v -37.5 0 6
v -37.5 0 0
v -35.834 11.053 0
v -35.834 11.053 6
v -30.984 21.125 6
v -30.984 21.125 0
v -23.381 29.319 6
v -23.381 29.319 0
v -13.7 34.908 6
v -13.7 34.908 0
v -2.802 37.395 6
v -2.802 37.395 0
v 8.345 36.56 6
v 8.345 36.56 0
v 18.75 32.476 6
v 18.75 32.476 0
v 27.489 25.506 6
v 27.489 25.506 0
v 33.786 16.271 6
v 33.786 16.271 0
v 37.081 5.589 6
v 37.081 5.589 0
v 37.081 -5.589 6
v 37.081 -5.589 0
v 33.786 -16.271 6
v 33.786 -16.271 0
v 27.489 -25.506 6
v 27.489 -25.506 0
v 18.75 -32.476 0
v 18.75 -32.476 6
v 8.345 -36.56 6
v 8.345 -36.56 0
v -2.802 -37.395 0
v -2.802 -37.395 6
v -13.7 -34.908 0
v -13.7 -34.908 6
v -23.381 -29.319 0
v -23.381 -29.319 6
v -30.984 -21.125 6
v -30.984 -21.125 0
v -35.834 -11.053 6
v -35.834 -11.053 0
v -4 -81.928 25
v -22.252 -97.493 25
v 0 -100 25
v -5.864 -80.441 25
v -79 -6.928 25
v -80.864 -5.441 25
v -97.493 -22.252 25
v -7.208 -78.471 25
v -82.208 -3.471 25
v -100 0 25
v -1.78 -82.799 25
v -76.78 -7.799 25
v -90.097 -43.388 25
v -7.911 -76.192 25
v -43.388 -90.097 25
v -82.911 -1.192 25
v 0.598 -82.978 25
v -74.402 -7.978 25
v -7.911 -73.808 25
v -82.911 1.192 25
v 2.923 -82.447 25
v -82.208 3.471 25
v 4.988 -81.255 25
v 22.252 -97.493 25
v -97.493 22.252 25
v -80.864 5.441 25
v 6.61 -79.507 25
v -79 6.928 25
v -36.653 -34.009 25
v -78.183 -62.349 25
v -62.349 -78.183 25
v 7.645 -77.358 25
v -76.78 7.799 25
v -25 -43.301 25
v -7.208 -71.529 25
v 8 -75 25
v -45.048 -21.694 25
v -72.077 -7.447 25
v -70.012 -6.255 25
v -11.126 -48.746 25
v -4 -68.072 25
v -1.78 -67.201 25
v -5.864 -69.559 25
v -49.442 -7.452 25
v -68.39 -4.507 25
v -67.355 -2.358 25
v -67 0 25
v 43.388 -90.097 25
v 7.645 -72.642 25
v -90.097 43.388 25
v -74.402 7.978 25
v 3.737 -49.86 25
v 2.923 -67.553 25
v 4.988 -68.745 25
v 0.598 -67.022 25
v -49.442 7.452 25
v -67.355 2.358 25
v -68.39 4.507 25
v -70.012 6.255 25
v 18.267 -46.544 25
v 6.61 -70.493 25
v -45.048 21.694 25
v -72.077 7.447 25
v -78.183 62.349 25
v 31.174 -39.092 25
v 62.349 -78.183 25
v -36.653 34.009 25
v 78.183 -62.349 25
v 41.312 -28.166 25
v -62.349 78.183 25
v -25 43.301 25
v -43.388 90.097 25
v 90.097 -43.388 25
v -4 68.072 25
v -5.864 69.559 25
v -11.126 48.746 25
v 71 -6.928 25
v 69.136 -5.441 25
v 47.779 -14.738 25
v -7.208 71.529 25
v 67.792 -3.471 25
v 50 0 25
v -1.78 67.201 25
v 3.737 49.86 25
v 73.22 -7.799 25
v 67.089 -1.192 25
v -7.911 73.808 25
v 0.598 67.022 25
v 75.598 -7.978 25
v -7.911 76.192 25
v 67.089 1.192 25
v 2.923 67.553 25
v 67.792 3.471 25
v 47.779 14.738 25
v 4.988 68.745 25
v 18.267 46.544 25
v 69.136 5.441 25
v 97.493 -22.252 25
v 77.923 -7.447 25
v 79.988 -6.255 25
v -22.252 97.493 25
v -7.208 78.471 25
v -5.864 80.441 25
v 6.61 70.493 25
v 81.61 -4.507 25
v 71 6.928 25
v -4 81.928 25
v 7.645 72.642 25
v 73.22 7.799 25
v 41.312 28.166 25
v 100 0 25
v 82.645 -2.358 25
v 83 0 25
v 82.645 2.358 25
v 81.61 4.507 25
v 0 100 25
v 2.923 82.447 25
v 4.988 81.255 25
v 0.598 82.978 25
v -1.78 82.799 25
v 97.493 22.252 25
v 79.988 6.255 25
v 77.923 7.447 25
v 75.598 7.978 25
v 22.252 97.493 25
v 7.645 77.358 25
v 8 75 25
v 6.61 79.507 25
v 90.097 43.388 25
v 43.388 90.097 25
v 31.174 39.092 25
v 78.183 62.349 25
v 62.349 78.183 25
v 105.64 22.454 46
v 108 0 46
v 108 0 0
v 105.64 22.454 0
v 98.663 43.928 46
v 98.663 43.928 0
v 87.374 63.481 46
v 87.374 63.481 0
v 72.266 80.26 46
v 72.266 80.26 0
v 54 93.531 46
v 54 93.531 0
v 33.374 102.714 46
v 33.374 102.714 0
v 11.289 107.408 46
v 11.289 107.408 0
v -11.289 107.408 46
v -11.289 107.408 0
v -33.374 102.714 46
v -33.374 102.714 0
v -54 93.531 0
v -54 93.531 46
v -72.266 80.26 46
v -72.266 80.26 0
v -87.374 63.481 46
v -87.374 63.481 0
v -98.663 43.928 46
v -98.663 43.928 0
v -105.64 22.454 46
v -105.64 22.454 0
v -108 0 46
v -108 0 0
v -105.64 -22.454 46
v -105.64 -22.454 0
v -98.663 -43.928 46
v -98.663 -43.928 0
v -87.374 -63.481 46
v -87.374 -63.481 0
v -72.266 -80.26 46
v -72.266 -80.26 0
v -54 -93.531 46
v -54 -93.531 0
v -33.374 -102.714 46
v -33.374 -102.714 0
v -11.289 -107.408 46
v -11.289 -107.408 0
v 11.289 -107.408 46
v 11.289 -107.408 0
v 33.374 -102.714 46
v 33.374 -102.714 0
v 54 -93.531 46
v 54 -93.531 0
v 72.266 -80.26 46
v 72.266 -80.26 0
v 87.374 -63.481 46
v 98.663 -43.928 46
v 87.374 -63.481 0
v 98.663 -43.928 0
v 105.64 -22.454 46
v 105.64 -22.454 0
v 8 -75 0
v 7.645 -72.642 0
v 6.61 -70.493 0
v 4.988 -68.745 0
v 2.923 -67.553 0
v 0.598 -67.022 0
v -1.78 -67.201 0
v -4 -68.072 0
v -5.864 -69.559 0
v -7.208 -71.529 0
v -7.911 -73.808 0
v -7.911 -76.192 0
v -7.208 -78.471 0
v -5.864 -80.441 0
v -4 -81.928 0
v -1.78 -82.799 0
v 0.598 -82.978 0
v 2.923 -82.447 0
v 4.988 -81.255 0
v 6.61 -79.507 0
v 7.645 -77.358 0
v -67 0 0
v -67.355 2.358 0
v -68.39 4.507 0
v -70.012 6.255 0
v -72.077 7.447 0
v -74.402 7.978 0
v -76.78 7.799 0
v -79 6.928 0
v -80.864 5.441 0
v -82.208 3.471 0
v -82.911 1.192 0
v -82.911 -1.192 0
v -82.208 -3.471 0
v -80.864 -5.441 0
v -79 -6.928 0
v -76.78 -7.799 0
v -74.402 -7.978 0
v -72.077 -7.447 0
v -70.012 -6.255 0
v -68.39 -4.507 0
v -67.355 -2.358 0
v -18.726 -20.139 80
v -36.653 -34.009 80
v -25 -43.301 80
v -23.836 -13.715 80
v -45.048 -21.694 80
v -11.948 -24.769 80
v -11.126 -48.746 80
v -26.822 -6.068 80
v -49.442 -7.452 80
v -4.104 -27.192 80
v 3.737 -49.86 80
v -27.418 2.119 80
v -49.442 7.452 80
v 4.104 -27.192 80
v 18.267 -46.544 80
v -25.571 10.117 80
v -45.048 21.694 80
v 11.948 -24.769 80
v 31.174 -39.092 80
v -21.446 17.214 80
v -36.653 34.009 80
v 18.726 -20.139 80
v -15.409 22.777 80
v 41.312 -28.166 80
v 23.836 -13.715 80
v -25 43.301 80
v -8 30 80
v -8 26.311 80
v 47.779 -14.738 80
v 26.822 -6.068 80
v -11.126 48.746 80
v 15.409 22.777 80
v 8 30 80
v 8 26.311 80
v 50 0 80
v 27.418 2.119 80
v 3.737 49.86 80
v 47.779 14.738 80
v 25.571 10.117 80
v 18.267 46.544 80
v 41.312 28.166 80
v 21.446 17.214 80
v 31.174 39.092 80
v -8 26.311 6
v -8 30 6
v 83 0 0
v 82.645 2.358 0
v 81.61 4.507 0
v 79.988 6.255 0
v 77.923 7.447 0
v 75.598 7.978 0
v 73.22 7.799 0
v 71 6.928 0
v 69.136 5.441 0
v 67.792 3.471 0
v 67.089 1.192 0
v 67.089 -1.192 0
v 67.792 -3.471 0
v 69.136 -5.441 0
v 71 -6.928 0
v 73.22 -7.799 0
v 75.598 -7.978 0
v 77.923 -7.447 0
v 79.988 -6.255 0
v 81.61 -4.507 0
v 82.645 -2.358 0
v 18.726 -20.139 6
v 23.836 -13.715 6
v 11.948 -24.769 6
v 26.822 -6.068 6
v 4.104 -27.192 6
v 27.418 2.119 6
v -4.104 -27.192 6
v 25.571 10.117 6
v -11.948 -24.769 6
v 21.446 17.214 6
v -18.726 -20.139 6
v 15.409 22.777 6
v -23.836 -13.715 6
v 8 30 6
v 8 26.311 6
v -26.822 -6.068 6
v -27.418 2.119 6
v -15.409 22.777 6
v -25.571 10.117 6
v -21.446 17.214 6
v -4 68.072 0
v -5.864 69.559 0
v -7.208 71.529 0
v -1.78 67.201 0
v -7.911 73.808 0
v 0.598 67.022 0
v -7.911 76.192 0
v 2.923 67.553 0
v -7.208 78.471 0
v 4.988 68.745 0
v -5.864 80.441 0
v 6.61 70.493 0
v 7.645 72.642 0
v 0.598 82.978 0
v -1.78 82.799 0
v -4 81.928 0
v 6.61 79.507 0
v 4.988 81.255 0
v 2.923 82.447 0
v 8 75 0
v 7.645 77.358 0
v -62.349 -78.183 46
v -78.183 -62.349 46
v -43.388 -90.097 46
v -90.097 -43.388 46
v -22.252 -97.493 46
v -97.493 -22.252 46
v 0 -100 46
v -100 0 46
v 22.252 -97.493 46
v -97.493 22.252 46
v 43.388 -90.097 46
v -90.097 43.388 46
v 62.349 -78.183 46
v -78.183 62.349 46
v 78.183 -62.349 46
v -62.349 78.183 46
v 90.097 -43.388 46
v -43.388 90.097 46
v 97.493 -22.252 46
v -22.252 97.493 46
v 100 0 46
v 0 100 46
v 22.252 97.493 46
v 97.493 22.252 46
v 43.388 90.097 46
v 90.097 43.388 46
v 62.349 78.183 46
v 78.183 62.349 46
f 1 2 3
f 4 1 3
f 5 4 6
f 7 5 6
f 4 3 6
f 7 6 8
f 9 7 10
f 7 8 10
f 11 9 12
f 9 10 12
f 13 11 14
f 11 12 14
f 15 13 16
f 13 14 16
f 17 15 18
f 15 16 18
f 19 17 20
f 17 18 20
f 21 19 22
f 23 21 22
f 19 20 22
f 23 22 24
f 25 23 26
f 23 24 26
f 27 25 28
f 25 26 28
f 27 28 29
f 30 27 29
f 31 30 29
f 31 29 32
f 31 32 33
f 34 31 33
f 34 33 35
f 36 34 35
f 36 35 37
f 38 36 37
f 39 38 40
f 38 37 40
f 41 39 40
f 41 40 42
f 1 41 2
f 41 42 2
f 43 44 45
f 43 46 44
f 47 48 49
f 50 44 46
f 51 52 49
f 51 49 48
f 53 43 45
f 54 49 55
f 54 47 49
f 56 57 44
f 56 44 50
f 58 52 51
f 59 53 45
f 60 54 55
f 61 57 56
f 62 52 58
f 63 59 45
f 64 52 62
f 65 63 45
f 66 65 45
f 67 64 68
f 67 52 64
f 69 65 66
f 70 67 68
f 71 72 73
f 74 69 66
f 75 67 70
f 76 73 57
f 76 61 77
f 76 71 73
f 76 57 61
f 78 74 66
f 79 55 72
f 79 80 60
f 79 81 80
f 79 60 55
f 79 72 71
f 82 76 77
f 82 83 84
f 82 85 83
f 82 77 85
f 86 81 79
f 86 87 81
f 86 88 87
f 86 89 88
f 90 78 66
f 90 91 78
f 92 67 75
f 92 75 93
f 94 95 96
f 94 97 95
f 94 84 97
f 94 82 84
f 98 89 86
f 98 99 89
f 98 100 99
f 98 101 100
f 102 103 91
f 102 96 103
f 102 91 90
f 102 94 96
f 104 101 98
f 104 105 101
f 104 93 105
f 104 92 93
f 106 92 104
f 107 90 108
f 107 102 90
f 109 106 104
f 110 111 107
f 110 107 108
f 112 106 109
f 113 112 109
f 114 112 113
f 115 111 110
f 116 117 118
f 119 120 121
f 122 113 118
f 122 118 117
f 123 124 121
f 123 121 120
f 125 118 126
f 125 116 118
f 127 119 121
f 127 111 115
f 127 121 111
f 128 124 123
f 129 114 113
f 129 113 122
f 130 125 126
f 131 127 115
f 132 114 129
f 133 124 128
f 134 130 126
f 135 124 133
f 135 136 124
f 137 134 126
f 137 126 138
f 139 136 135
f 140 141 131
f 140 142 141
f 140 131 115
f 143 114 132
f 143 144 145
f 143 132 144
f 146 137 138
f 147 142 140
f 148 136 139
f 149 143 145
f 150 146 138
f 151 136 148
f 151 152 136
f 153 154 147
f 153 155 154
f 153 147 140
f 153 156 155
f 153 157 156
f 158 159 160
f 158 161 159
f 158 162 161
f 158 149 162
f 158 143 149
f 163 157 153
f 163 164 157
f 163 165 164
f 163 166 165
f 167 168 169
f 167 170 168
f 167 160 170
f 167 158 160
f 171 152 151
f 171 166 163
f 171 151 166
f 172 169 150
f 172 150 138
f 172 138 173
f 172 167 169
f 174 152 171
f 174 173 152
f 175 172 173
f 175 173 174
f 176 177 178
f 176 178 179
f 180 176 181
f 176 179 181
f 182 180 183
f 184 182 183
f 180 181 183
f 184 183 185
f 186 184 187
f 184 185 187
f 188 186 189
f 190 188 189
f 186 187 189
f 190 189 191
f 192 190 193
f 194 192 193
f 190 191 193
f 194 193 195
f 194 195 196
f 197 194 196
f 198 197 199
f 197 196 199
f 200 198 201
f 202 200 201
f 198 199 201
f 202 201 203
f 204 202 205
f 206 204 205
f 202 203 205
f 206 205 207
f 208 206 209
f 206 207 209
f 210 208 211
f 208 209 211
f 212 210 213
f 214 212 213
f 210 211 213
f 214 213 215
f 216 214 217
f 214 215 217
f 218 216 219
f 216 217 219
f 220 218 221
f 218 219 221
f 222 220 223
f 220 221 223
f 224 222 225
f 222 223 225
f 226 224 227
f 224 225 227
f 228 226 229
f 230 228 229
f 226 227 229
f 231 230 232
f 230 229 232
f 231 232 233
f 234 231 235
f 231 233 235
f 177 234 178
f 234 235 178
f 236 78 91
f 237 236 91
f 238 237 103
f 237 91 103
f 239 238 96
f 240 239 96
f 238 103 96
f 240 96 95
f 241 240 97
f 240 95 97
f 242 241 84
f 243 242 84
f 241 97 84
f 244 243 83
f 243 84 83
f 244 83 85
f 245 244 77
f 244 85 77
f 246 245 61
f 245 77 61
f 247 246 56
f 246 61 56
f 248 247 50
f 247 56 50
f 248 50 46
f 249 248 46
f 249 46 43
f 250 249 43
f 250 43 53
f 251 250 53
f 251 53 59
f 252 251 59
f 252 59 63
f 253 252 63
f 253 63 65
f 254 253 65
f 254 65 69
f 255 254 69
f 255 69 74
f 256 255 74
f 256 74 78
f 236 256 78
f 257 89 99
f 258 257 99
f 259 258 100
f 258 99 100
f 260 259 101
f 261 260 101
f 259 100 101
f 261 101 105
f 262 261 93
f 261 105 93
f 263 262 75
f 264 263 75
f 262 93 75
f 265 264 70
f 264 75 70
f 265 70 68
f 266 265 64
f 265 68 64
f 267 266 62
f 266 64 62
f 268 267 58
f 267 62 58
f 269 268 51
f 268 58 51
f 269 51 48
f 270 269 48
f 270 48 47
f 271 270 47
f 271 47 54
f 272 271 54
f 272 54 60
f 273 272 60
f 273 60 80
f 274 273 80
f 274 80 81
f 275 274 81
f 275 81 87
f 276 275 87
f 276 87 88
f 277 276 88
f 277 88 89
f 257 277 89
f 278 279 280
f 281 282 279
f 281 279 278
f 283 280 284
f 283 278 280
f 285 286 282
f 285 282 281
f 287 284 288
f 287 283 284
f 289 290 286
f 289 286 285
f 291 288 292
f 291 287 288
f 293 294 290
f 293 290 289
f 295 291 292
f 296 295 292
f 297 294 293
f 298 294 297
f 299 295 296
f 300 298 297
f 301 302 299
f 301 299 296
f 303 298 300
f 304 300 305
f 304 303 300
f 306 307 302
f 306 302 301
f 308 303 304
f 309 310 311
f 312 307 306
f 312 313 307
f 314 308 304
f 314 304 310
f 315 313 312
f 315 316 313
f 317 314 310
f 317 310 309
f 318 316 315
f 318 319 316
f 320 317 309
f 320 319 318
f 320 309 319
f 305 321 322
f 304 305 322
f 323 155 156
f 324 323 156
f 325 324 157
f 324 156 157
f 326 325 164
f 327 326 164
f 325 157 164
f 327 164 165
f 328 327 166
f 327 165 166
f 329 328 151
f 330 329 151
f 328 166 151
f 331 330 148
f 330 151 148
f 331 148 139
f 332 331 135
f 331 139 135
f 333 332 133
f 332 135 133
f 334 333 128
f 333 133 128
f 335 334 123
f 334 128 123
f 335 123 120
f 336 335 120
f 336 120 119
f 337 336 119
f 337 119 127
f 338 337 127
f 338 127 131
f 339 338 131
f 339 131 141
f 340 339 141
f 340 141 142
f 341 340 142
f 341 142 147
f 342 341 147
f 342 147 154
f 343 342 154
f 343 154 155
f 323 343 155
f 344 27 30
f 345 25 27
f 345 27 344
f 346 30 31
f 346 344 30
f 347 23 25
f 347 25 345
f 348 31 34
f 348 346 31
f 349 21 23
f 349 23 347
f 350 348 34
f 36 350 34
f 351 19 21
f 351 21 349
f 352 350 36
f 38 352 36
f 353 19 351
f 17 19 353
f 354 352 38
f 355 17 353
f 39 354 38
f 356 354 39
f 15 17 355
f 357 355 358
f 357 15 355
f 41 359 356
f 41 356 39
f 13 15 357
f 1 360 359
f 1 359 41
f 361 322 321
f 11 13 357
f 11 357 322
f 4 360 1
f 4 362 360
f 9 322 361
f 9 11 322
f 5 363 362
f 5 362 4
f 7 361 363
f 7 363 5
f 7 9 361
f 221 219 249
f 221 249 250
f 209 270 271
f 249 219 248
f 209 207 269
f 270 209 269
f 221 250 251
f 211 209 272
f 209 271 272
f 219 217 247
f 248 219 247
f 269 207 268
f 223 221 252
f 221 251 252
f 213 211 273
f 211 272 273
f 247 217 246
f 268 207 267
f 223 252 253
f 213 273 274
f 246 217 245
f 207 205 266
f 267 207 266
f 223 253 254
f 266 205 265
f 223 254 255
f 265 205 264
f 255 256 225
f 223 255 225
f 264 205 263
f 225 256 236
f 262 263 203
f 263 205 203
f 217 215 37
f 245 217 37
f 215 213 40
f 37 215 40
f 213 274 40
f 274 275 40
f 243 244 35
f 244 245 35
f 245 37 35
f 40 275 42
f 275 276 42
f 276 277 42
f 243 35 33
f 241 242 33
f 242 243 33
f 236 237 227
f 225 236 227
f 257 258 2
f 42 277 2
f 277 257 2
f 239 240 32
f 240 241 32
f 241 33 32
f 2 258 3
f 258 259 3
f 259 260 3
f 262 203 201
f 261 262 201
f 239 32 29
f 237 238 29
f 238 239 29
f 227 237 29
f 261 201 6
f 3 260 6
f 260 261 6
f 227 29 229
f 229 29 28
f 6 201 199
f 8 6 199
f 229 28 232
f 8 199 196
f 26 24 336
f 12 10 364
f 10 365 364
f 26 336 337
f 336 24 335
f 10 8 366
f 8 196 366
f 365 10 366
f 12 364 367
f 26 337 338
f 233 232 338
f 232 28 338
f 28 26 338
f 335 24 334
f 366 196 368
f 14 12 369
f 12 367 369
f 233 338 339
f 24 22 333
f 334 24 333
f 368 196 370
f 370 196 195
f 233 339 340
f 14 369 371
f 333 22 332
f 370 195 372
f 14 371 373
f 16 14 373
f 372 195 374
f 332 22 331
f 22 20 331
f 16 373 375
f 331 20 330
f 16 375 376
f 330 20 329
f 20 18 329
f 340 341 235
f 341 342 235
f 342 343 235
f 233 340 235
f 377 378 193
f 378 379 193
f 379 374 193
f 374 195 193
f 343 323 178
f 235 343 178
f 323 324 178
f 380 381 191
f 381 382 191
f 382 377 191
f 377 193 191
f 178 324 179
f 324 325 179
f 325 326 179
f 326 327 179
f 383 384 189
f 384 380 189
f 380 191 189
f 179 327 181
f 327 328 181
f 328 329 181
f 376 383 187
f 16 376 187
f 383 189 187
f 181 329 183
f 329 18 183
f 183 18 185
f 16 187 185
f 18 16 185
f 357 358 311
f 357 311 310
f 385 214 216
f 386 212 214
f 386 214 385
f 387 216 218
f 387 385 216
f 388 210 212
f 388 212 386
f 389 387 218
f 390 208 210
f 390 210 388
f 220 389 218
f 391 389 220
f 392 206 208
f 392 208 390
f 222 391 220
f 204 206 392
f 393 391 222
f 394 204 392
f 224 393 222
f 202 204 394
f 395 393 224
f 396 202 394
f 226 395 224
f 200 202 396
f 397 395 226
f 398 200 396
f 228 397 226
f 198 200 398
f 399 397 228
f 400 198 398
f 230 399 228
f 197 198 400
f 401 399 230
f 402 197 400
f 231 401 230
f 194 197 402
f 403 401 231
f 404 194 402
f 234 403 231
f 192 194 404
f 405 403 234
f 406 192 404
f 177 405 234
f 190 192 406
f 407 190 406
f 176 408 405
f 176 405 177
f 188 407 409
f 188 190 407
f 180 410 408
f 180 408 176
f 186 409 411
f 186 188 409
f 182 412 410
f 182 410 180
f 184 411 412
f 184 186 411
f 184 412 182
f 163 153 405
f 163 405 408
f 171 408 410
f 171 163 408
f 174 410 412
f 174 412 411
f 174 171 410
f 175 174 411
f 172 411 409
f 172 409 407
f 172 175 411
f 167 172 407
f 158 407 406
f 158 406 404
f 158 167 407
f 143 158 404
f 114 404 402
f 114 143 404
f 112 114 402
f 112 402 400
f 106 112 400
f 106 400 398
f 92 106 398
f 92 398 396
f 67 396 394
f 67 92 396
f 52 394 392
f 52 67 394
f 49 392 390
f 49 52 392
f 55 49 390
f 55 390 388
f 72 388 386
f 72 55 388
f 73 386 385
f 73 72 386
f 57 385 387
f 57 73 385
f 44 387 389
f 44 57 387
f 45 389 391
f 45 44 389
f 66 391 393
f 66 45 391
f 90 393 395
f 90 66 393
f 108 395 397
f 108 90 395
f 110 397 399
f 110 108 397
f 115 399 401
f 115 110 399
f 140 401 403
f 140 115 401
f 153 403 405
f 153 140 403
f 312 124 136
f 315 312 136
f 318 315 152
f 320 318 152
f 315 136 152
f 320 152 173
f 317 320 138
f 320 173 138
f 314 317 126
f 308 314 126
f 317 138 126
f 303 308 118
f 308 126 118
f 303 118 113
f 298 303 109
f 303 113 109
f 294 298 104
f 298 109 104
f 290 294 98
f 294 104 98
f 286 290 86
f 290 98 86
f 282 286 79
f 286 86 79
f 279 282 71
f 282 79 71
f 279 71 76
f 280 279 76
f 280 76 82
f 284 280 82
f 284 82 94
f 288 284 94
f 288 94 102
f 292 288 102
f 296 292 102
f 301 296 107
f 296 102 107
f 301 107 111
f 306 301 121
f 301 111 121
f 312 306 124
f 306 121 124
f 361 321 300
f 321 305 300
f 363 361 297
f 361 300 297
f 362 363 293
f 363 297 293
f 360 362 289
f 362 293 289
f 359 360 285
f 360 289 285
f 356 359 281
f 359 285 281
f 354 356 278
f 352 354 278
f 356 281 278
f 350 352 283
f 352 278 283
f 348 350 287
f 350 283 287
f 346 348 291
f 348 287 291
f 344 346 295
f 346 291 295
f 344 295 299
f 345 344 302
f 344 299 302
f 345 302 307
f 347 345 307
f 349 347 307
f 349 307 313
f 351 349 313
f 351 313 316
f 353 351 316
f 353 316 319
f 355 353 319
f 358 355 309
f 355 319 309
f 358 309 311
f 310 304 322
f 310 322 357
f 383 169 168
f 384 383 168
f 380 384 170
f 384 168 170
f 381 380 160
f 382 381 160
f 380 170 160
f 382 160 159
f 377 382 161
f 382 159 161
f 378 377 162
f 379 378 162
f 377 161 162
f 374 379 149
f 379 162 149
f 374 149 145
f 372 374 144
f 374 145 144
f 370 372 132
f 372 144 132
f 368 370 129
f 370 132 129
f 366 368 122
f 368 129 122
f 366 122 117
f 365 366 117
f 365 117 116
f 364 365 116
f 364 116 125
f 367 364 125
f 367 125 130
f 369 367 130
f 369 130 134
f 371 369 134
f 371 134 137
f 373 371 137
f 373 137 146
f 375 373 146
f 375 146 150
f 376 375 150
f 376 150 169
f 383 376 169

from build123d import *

# Parameters (mm, degrees)
SKETCH1_R           = 108
BOSS_EXTRUDE1_DEPTH = 25
SKETCH2_R           = 108
SKETCH2_R_2         = 100
BOSS_EXTRUDE2_DEPTH = 21
SKETCH3_R           = 50
SKETCH3_R_2         = 27.5
BOSS_EXTRUDE3_DEPTH = 55
SKETCH4_R           = 8
CUT_EXTRUDE1_DEPTH  = 26
SKETCH5_R           = 37.5
CUT_EXTRUDE2_DEPTH  = 6
SKETCH6_R           = 27.5
CUT_EXTRUDE4_DEPTH  = 26
SKETCH7_W           = 16
SKETCH7_H           = 30
CUT_EXTRUDE5_DEPTH  = 81


with BuildPart() as part:
    # Sketch1 → Boss-Extrude1 (new body)
    with BuildSketch(Plane.XY):
        Circle(SKETCH1_R)
    extrude(amount=BOSS_EXTRUDE1_DEPTH)

    # Sketch2 → Boss-Extrude2 (add)
    with BuildSketch(Plane.XY.offset(25)):
        Circle(SKETCH2_R)
        Circle(SKETCH2_R_2, mode=Mode.SUBTRACT)
    extrude(amount=BOSS_EXTRUDE2_DEPTH)

    # Sketch3 → Boss-Extrude3 (add)
    with BuildSketch(Plane.XY.offset(25)):
        Circle(SKETCH3_R)
        Circle(SKETCH3_R_2, mode=Mode.SUBTRACT)
    extrude(amount=BOSS_EXTRUDE3_DEPTH)

    # Sketch4 → Cut-Extrude1 (cut, through all)
    with BuildSketch(Plane.XY.offset(25)):
        with Locations((0, 75)):
            Circle(SKETCH4_R)
        with Locations((75, 0)):
            Circle(SKETCH4_R)
        with Locations((0, -75)):
            Circle(SKETCH4_R)
        with Locations((-75, 0)):
            Circle(SKETCH4_R)
    extrude(amount=-CUT_EXTRUDE1_DEPTH, mode=Mode.SUBTRACT)

    # Sketch5 → Cut-Extrude2 (cut)
    with BuildSketch(Plane(origin=(0, 0, 0), x_dir=(-1, 0, 0), z_dir=(0, 0, -1))):
        Circle(SKETCH5_R)
    extrude(amount=-CUT_EXTRUDE2_DEPTH, mode=Mode.SUBTRACT)

    # Sketch6 → Cut-Extrude4 (cut, through all)
    with BuildSketch(Plane.XY.offset(25)):
        Circle(SKETCH6_R)
    extrude(amount=-CUT_EXTRUDE4_DEPTH, mode=Mode.SUBTRACT)

    # Sketch7 → Cut-Extrude5 (cut, through all)
    with BuildSketch(Plane.XY.offset(80)):
        with Locations((0, 15)):
            Rectangle(SKETCH7_W, SKETCH7_H)
    extrude(amount=-CUT_EXTRUDE5_DEPTH, mode=Mode.SUBTRACT)


solid = part.part
